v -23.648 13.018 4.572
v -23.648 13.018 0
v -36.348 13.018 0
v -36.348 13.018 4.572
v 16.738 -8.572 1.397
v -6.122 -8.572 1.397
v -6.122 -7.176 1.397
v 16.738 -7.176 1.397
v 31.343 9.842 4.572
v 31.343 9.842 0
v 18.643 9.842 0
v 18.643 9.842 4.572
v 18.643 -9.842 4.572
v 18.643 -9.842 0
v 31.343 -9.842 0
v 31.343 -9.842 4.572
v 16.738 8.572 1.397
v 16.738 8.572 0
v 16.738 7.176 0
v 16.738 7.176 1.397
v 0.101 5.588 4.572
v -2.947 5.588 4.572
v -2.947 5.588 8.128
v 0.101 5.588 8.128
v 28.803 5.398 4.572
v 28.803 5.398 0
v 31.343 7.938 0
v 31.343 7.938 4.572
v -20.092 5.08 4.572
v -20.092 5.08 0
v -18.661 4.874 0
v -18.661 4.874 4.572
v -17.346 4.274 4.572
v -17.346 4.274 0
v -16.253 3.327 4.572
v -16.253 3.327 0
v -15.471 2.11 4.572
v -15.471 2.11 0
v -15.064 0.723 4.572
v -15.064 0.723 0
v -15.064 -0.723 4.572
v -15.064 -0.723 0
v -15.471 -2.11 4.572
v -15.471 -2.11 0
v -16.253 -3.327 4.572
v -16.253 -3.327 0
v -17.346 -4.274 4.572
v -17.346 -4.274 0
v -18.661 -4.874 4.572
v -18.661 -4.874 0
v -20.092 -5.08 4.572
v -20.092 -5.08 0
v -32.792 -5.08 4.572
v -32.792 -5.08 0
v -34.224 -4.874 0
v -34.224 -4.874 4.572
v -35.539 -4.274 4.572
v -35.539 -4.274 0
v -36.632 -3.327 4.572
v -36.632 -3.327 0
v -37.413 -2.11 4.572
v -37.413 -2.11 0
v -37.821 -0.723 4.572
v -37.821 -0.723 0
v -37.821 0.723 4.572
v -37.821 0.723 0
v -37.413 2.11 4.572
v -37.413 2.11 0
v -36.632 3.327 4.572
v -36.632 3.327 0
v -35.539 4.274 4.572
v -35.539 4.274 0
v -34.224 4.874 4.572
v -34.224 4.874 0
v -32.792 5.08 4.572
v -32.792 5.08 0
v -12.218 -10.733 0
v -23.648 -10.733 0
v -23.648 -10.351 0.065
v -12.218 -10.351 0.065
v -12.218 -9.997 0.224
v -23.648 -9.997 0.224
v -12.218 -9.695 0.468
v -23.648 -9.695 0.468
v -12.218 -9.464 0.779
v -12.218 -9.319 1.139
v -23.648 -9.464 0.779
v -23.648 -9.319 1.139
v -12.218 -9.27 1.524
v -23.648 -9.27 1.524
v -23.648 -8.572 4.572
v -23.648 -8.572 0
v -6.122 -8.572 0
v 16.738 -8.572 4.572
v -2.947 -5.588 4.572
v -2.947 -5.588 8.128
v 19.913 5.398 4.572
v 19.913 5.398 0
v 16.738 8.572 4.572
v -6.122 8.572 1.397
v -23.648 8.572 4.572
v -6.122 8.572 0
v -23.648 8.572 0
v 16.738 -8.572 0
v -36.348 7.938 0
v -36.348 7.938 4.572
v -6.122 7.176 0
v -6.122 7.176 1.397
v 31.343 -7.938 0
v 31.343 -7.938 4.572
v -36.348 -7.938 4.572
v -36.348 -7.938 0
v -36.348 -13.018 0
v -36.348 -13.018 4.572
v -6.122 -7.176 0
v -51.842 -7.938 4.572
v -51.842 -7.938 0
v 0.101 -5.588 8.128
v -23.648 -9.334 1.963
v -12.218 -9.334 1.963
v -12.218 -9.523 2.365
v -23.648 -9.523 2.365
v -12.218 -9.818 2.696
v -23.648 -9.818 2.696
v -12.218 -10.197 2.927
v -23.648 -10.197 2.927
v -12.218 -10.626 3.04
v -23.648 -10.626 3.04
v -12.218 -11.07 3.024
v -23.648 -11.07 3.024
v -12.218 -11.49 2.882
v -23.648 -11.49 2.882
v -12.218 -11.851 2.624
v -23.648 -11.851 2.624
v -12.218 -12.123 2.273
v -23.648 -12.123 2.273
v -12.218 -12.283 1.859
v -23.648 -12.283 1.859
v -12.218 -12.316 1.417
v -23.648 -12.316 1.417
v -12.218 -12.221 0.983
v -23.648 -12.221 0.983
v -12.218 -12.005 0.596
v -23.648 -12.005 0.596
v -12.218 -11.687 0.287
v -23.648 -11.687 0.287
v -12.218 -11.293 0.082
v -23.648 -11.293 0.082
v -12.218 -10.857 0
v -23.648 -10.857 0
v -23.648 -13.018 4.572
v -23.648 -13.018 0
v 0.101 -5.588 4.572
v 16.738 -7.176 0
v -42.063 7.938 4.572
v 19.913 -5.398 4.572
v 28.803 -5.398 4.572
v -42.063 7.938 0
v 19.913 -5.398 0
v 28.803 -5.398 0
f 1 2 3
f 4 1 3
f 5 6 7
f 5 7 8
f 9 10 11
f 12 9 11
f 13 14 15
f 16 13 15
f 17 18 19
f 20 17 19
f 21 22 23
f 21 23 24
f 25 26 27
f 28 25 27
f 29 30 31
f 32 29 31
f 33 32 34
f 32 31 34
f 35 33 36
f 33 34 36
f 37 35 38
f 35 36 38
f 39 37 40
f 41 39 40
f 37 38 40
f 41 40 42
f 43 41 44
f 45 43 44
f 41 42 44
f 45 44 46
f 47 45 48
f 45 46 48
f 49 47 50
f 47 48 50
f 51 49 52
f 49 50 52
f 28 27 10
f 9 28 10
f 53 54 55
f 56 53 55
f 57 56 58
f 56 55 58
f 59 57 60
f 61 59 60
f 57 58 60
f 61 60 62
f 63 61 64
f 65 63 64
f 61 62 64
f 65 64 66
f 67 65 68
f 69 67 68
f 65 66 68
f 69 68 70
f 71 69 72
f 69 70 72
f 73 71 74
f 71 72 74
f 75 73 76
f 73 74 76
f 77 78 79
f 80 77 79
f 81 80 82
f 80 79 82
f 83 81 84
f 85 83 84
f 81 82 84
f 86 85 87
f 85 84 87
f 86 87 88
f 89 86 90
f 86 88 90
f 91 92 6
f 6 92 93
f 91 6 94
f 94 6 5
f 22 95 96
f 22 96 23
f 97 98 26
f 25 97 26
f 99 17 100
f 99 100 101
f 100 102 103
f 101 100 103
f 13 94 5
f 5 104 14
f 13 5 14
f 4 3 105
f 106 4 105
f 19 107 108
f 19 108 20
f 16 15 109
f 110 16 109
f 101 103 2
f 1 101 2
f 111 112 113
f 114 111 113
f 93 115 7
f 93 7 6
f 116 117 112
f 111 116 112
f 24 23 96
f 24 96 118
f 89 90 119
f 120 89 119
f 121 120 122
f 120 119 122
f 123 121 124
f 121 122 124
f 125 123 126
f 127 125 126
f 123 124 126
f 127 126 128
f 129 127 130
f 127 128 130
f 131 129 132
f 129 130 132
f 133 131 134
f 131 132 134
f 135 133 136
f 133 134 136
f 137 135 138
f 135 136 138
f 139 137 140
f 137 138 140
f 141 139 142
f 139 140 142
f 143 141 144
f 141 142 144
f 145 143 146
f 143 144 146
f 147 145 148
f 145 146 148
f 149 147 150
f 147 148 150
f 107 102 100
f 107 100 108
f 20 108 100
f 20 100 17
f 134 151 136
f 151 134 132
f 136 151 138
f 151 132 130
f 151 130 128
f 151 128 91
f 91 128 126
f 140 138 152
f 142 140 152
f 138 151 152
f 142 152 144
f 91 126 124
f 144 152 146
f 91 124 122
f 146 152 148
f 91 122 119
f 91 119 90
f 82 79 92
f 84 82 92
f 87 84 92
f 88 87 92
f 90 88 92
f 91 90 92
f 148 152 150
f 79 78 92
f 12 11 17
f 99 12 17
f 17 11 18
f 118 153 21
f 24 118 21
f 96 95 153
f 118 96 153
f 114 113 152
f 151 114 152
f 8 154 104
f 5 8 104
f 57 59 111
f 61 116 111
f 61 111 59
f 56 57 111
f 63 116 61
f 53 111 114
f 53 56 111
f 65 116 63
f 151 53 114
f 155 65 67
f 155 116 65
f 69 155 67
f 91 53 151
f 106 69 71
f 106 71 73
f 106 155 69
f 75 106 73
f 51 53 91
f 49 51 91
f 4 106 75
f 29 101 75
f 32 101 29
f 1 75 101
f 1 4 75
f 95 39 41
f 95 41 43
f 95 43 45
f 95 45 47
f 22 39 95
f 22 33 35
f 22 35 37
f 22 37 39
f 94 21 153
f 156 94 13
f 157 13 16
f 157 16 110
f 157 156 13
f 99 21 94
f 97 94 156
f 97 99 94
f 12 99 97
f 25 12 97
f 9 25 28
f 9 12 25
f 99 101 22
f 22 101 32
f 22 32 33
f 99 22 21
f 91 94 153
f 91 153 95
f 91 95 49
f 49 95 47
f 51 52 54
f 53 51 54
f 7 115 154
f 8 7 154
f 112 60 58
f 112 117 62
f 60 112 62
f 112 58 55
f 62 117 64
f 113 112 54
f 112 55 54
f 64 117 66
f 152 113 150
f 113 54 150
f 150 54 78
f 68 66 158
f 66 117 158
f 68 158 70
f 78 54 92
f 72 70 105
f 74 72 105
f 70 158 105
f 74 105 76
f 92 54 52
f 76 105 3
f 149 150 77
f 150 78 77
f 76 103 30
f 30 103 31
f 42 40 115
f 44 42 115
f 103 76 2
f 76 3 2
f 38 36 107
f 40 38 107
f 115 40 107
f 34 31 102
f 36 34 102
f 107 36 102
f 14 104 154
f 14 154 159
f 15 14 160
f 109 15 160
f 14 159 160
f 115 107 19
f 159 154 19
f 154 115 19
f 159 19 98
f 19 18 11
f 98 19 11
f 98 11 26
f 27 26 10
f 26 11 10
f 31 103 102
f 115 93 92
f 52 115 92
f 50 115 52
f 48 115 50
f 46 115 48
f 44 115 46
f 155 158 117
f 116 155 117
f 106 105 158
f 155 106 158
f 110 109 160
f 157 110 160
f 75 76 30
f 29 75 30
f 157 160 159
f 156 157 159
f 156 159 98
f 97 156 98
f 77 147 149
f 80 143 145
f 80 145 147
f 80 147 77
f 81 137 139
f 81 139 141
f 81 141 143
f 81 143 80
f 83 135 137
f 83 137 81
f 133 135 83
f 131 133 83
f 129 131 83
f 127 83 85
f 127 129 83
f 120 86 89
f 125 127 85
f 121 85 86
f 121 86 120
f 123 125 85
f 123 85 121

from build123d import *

# Parameters (mm, degrees)
F0_W     = 3.048
F0_H     = 11.176
F1_DEPTH = 4.572
F2_DEPTH = 8.128
F4_DEPTH = 11.43
F5_W     = 22.86
F5_H     = 1.397
F6_DEPTH = 1.397
F7_DEPTH = 1.397


with BuildPart() as f1:
    # F0 (on Top) → F1 (new body)
    with BuildSketch(Plane.XY):
        Polygon((18.642572, -9.8425), (31.342572, -9.8425), (31.342572, -7.9375), (28.802572, -5.3975), (19.912572, -5.3975), (19.912572, 5.3975), (28.802572, 5.3975), (31.342572, 7.9375), (31.342572, 9.8425), (18.642572, 9.8425), (16.737572, 8.5725), (-23.648428, 8.5725), (-23.648428, 13.0175), (-36.348428, 13.0175), (-36.348428, 7.9375), (-42.063428, 7.9375), (-51.842428, -7.9375), (-36.348428, -7.9375), (-36.348428, -13.0175), (-23.648428, -13.0175), (-23.648428, -8.5725), (16.737572, -8.5725), align=None)
        with BuildLine():
            Line((-32.792428, 5.08), (-20.092428, 5.08))
            ThreePointArc((-20.092428, 5.08), (-15.012428, 0), (-20.092428, -5.08))
            Line((-20.092428, -5.08), (-32.792428, -5.08))
            ThreePointArc((-32.792428, -5.08), (-37.872428, 0), (-32.792428, 5.08))
        make_face(mode=Mode.SUBTRACT)
        with Locations((-1.423428, 0)):
            Rectangle(F0_W, F0_H, mode=Mode.SUBTRACT)
    extrude(amount=F1_DEPTH)

    # F0 (on Top) → F2 (join)
    with BuildSketch(Plane.XY):
        with Locations((-1.423428, 0)):
            Rectangle(F0_W, F0_H)
    extrude(amount=F2_DEPTH)

    # F3 (on face) → F4 (join)
    with BuildSketch(Plane.YZ.offset(-23.648428)):
        with BuildLine():
            ThreePointArc((-10.733225, 0), (-9.69486, 0.467551), (-9.269748, 1.524))
            ThreePointArc((-9.269748, 1.524), (-11.851449, 2.62414), (-10.856775, 0))
            Line((-10.856775, 0), (-10.733225, 0))
        make_face()
    extrude(amount=F4_DEPTH)

    # F5 (on face) → F6 (cut)
    with BuildSketch(Plane(origin=(0, 0, 0), x_dir=(1, 0, 0), z_dir=(0, 0, -1))):
        with Locations((5.307572, 7.874)):
            Rectangle(F5_W, F5_H)
    extrude(amount=-F6_DEPTH, mode=Mode.SUBTRACT)

    # F5 (on face) → F7 (cut)
    with BuildSketch(Plane(origin=(0, 0, 0), x_dir=(1, 0, 0), z_dir=(0, 0, -1))):
        with Locations((5.307572, -7.874)):
            Rectangle(F5_W, F5_H)
    extrude(amount=-F7_DEPTH, mode=Mode.SUBTRACT)


solid = f1.part
